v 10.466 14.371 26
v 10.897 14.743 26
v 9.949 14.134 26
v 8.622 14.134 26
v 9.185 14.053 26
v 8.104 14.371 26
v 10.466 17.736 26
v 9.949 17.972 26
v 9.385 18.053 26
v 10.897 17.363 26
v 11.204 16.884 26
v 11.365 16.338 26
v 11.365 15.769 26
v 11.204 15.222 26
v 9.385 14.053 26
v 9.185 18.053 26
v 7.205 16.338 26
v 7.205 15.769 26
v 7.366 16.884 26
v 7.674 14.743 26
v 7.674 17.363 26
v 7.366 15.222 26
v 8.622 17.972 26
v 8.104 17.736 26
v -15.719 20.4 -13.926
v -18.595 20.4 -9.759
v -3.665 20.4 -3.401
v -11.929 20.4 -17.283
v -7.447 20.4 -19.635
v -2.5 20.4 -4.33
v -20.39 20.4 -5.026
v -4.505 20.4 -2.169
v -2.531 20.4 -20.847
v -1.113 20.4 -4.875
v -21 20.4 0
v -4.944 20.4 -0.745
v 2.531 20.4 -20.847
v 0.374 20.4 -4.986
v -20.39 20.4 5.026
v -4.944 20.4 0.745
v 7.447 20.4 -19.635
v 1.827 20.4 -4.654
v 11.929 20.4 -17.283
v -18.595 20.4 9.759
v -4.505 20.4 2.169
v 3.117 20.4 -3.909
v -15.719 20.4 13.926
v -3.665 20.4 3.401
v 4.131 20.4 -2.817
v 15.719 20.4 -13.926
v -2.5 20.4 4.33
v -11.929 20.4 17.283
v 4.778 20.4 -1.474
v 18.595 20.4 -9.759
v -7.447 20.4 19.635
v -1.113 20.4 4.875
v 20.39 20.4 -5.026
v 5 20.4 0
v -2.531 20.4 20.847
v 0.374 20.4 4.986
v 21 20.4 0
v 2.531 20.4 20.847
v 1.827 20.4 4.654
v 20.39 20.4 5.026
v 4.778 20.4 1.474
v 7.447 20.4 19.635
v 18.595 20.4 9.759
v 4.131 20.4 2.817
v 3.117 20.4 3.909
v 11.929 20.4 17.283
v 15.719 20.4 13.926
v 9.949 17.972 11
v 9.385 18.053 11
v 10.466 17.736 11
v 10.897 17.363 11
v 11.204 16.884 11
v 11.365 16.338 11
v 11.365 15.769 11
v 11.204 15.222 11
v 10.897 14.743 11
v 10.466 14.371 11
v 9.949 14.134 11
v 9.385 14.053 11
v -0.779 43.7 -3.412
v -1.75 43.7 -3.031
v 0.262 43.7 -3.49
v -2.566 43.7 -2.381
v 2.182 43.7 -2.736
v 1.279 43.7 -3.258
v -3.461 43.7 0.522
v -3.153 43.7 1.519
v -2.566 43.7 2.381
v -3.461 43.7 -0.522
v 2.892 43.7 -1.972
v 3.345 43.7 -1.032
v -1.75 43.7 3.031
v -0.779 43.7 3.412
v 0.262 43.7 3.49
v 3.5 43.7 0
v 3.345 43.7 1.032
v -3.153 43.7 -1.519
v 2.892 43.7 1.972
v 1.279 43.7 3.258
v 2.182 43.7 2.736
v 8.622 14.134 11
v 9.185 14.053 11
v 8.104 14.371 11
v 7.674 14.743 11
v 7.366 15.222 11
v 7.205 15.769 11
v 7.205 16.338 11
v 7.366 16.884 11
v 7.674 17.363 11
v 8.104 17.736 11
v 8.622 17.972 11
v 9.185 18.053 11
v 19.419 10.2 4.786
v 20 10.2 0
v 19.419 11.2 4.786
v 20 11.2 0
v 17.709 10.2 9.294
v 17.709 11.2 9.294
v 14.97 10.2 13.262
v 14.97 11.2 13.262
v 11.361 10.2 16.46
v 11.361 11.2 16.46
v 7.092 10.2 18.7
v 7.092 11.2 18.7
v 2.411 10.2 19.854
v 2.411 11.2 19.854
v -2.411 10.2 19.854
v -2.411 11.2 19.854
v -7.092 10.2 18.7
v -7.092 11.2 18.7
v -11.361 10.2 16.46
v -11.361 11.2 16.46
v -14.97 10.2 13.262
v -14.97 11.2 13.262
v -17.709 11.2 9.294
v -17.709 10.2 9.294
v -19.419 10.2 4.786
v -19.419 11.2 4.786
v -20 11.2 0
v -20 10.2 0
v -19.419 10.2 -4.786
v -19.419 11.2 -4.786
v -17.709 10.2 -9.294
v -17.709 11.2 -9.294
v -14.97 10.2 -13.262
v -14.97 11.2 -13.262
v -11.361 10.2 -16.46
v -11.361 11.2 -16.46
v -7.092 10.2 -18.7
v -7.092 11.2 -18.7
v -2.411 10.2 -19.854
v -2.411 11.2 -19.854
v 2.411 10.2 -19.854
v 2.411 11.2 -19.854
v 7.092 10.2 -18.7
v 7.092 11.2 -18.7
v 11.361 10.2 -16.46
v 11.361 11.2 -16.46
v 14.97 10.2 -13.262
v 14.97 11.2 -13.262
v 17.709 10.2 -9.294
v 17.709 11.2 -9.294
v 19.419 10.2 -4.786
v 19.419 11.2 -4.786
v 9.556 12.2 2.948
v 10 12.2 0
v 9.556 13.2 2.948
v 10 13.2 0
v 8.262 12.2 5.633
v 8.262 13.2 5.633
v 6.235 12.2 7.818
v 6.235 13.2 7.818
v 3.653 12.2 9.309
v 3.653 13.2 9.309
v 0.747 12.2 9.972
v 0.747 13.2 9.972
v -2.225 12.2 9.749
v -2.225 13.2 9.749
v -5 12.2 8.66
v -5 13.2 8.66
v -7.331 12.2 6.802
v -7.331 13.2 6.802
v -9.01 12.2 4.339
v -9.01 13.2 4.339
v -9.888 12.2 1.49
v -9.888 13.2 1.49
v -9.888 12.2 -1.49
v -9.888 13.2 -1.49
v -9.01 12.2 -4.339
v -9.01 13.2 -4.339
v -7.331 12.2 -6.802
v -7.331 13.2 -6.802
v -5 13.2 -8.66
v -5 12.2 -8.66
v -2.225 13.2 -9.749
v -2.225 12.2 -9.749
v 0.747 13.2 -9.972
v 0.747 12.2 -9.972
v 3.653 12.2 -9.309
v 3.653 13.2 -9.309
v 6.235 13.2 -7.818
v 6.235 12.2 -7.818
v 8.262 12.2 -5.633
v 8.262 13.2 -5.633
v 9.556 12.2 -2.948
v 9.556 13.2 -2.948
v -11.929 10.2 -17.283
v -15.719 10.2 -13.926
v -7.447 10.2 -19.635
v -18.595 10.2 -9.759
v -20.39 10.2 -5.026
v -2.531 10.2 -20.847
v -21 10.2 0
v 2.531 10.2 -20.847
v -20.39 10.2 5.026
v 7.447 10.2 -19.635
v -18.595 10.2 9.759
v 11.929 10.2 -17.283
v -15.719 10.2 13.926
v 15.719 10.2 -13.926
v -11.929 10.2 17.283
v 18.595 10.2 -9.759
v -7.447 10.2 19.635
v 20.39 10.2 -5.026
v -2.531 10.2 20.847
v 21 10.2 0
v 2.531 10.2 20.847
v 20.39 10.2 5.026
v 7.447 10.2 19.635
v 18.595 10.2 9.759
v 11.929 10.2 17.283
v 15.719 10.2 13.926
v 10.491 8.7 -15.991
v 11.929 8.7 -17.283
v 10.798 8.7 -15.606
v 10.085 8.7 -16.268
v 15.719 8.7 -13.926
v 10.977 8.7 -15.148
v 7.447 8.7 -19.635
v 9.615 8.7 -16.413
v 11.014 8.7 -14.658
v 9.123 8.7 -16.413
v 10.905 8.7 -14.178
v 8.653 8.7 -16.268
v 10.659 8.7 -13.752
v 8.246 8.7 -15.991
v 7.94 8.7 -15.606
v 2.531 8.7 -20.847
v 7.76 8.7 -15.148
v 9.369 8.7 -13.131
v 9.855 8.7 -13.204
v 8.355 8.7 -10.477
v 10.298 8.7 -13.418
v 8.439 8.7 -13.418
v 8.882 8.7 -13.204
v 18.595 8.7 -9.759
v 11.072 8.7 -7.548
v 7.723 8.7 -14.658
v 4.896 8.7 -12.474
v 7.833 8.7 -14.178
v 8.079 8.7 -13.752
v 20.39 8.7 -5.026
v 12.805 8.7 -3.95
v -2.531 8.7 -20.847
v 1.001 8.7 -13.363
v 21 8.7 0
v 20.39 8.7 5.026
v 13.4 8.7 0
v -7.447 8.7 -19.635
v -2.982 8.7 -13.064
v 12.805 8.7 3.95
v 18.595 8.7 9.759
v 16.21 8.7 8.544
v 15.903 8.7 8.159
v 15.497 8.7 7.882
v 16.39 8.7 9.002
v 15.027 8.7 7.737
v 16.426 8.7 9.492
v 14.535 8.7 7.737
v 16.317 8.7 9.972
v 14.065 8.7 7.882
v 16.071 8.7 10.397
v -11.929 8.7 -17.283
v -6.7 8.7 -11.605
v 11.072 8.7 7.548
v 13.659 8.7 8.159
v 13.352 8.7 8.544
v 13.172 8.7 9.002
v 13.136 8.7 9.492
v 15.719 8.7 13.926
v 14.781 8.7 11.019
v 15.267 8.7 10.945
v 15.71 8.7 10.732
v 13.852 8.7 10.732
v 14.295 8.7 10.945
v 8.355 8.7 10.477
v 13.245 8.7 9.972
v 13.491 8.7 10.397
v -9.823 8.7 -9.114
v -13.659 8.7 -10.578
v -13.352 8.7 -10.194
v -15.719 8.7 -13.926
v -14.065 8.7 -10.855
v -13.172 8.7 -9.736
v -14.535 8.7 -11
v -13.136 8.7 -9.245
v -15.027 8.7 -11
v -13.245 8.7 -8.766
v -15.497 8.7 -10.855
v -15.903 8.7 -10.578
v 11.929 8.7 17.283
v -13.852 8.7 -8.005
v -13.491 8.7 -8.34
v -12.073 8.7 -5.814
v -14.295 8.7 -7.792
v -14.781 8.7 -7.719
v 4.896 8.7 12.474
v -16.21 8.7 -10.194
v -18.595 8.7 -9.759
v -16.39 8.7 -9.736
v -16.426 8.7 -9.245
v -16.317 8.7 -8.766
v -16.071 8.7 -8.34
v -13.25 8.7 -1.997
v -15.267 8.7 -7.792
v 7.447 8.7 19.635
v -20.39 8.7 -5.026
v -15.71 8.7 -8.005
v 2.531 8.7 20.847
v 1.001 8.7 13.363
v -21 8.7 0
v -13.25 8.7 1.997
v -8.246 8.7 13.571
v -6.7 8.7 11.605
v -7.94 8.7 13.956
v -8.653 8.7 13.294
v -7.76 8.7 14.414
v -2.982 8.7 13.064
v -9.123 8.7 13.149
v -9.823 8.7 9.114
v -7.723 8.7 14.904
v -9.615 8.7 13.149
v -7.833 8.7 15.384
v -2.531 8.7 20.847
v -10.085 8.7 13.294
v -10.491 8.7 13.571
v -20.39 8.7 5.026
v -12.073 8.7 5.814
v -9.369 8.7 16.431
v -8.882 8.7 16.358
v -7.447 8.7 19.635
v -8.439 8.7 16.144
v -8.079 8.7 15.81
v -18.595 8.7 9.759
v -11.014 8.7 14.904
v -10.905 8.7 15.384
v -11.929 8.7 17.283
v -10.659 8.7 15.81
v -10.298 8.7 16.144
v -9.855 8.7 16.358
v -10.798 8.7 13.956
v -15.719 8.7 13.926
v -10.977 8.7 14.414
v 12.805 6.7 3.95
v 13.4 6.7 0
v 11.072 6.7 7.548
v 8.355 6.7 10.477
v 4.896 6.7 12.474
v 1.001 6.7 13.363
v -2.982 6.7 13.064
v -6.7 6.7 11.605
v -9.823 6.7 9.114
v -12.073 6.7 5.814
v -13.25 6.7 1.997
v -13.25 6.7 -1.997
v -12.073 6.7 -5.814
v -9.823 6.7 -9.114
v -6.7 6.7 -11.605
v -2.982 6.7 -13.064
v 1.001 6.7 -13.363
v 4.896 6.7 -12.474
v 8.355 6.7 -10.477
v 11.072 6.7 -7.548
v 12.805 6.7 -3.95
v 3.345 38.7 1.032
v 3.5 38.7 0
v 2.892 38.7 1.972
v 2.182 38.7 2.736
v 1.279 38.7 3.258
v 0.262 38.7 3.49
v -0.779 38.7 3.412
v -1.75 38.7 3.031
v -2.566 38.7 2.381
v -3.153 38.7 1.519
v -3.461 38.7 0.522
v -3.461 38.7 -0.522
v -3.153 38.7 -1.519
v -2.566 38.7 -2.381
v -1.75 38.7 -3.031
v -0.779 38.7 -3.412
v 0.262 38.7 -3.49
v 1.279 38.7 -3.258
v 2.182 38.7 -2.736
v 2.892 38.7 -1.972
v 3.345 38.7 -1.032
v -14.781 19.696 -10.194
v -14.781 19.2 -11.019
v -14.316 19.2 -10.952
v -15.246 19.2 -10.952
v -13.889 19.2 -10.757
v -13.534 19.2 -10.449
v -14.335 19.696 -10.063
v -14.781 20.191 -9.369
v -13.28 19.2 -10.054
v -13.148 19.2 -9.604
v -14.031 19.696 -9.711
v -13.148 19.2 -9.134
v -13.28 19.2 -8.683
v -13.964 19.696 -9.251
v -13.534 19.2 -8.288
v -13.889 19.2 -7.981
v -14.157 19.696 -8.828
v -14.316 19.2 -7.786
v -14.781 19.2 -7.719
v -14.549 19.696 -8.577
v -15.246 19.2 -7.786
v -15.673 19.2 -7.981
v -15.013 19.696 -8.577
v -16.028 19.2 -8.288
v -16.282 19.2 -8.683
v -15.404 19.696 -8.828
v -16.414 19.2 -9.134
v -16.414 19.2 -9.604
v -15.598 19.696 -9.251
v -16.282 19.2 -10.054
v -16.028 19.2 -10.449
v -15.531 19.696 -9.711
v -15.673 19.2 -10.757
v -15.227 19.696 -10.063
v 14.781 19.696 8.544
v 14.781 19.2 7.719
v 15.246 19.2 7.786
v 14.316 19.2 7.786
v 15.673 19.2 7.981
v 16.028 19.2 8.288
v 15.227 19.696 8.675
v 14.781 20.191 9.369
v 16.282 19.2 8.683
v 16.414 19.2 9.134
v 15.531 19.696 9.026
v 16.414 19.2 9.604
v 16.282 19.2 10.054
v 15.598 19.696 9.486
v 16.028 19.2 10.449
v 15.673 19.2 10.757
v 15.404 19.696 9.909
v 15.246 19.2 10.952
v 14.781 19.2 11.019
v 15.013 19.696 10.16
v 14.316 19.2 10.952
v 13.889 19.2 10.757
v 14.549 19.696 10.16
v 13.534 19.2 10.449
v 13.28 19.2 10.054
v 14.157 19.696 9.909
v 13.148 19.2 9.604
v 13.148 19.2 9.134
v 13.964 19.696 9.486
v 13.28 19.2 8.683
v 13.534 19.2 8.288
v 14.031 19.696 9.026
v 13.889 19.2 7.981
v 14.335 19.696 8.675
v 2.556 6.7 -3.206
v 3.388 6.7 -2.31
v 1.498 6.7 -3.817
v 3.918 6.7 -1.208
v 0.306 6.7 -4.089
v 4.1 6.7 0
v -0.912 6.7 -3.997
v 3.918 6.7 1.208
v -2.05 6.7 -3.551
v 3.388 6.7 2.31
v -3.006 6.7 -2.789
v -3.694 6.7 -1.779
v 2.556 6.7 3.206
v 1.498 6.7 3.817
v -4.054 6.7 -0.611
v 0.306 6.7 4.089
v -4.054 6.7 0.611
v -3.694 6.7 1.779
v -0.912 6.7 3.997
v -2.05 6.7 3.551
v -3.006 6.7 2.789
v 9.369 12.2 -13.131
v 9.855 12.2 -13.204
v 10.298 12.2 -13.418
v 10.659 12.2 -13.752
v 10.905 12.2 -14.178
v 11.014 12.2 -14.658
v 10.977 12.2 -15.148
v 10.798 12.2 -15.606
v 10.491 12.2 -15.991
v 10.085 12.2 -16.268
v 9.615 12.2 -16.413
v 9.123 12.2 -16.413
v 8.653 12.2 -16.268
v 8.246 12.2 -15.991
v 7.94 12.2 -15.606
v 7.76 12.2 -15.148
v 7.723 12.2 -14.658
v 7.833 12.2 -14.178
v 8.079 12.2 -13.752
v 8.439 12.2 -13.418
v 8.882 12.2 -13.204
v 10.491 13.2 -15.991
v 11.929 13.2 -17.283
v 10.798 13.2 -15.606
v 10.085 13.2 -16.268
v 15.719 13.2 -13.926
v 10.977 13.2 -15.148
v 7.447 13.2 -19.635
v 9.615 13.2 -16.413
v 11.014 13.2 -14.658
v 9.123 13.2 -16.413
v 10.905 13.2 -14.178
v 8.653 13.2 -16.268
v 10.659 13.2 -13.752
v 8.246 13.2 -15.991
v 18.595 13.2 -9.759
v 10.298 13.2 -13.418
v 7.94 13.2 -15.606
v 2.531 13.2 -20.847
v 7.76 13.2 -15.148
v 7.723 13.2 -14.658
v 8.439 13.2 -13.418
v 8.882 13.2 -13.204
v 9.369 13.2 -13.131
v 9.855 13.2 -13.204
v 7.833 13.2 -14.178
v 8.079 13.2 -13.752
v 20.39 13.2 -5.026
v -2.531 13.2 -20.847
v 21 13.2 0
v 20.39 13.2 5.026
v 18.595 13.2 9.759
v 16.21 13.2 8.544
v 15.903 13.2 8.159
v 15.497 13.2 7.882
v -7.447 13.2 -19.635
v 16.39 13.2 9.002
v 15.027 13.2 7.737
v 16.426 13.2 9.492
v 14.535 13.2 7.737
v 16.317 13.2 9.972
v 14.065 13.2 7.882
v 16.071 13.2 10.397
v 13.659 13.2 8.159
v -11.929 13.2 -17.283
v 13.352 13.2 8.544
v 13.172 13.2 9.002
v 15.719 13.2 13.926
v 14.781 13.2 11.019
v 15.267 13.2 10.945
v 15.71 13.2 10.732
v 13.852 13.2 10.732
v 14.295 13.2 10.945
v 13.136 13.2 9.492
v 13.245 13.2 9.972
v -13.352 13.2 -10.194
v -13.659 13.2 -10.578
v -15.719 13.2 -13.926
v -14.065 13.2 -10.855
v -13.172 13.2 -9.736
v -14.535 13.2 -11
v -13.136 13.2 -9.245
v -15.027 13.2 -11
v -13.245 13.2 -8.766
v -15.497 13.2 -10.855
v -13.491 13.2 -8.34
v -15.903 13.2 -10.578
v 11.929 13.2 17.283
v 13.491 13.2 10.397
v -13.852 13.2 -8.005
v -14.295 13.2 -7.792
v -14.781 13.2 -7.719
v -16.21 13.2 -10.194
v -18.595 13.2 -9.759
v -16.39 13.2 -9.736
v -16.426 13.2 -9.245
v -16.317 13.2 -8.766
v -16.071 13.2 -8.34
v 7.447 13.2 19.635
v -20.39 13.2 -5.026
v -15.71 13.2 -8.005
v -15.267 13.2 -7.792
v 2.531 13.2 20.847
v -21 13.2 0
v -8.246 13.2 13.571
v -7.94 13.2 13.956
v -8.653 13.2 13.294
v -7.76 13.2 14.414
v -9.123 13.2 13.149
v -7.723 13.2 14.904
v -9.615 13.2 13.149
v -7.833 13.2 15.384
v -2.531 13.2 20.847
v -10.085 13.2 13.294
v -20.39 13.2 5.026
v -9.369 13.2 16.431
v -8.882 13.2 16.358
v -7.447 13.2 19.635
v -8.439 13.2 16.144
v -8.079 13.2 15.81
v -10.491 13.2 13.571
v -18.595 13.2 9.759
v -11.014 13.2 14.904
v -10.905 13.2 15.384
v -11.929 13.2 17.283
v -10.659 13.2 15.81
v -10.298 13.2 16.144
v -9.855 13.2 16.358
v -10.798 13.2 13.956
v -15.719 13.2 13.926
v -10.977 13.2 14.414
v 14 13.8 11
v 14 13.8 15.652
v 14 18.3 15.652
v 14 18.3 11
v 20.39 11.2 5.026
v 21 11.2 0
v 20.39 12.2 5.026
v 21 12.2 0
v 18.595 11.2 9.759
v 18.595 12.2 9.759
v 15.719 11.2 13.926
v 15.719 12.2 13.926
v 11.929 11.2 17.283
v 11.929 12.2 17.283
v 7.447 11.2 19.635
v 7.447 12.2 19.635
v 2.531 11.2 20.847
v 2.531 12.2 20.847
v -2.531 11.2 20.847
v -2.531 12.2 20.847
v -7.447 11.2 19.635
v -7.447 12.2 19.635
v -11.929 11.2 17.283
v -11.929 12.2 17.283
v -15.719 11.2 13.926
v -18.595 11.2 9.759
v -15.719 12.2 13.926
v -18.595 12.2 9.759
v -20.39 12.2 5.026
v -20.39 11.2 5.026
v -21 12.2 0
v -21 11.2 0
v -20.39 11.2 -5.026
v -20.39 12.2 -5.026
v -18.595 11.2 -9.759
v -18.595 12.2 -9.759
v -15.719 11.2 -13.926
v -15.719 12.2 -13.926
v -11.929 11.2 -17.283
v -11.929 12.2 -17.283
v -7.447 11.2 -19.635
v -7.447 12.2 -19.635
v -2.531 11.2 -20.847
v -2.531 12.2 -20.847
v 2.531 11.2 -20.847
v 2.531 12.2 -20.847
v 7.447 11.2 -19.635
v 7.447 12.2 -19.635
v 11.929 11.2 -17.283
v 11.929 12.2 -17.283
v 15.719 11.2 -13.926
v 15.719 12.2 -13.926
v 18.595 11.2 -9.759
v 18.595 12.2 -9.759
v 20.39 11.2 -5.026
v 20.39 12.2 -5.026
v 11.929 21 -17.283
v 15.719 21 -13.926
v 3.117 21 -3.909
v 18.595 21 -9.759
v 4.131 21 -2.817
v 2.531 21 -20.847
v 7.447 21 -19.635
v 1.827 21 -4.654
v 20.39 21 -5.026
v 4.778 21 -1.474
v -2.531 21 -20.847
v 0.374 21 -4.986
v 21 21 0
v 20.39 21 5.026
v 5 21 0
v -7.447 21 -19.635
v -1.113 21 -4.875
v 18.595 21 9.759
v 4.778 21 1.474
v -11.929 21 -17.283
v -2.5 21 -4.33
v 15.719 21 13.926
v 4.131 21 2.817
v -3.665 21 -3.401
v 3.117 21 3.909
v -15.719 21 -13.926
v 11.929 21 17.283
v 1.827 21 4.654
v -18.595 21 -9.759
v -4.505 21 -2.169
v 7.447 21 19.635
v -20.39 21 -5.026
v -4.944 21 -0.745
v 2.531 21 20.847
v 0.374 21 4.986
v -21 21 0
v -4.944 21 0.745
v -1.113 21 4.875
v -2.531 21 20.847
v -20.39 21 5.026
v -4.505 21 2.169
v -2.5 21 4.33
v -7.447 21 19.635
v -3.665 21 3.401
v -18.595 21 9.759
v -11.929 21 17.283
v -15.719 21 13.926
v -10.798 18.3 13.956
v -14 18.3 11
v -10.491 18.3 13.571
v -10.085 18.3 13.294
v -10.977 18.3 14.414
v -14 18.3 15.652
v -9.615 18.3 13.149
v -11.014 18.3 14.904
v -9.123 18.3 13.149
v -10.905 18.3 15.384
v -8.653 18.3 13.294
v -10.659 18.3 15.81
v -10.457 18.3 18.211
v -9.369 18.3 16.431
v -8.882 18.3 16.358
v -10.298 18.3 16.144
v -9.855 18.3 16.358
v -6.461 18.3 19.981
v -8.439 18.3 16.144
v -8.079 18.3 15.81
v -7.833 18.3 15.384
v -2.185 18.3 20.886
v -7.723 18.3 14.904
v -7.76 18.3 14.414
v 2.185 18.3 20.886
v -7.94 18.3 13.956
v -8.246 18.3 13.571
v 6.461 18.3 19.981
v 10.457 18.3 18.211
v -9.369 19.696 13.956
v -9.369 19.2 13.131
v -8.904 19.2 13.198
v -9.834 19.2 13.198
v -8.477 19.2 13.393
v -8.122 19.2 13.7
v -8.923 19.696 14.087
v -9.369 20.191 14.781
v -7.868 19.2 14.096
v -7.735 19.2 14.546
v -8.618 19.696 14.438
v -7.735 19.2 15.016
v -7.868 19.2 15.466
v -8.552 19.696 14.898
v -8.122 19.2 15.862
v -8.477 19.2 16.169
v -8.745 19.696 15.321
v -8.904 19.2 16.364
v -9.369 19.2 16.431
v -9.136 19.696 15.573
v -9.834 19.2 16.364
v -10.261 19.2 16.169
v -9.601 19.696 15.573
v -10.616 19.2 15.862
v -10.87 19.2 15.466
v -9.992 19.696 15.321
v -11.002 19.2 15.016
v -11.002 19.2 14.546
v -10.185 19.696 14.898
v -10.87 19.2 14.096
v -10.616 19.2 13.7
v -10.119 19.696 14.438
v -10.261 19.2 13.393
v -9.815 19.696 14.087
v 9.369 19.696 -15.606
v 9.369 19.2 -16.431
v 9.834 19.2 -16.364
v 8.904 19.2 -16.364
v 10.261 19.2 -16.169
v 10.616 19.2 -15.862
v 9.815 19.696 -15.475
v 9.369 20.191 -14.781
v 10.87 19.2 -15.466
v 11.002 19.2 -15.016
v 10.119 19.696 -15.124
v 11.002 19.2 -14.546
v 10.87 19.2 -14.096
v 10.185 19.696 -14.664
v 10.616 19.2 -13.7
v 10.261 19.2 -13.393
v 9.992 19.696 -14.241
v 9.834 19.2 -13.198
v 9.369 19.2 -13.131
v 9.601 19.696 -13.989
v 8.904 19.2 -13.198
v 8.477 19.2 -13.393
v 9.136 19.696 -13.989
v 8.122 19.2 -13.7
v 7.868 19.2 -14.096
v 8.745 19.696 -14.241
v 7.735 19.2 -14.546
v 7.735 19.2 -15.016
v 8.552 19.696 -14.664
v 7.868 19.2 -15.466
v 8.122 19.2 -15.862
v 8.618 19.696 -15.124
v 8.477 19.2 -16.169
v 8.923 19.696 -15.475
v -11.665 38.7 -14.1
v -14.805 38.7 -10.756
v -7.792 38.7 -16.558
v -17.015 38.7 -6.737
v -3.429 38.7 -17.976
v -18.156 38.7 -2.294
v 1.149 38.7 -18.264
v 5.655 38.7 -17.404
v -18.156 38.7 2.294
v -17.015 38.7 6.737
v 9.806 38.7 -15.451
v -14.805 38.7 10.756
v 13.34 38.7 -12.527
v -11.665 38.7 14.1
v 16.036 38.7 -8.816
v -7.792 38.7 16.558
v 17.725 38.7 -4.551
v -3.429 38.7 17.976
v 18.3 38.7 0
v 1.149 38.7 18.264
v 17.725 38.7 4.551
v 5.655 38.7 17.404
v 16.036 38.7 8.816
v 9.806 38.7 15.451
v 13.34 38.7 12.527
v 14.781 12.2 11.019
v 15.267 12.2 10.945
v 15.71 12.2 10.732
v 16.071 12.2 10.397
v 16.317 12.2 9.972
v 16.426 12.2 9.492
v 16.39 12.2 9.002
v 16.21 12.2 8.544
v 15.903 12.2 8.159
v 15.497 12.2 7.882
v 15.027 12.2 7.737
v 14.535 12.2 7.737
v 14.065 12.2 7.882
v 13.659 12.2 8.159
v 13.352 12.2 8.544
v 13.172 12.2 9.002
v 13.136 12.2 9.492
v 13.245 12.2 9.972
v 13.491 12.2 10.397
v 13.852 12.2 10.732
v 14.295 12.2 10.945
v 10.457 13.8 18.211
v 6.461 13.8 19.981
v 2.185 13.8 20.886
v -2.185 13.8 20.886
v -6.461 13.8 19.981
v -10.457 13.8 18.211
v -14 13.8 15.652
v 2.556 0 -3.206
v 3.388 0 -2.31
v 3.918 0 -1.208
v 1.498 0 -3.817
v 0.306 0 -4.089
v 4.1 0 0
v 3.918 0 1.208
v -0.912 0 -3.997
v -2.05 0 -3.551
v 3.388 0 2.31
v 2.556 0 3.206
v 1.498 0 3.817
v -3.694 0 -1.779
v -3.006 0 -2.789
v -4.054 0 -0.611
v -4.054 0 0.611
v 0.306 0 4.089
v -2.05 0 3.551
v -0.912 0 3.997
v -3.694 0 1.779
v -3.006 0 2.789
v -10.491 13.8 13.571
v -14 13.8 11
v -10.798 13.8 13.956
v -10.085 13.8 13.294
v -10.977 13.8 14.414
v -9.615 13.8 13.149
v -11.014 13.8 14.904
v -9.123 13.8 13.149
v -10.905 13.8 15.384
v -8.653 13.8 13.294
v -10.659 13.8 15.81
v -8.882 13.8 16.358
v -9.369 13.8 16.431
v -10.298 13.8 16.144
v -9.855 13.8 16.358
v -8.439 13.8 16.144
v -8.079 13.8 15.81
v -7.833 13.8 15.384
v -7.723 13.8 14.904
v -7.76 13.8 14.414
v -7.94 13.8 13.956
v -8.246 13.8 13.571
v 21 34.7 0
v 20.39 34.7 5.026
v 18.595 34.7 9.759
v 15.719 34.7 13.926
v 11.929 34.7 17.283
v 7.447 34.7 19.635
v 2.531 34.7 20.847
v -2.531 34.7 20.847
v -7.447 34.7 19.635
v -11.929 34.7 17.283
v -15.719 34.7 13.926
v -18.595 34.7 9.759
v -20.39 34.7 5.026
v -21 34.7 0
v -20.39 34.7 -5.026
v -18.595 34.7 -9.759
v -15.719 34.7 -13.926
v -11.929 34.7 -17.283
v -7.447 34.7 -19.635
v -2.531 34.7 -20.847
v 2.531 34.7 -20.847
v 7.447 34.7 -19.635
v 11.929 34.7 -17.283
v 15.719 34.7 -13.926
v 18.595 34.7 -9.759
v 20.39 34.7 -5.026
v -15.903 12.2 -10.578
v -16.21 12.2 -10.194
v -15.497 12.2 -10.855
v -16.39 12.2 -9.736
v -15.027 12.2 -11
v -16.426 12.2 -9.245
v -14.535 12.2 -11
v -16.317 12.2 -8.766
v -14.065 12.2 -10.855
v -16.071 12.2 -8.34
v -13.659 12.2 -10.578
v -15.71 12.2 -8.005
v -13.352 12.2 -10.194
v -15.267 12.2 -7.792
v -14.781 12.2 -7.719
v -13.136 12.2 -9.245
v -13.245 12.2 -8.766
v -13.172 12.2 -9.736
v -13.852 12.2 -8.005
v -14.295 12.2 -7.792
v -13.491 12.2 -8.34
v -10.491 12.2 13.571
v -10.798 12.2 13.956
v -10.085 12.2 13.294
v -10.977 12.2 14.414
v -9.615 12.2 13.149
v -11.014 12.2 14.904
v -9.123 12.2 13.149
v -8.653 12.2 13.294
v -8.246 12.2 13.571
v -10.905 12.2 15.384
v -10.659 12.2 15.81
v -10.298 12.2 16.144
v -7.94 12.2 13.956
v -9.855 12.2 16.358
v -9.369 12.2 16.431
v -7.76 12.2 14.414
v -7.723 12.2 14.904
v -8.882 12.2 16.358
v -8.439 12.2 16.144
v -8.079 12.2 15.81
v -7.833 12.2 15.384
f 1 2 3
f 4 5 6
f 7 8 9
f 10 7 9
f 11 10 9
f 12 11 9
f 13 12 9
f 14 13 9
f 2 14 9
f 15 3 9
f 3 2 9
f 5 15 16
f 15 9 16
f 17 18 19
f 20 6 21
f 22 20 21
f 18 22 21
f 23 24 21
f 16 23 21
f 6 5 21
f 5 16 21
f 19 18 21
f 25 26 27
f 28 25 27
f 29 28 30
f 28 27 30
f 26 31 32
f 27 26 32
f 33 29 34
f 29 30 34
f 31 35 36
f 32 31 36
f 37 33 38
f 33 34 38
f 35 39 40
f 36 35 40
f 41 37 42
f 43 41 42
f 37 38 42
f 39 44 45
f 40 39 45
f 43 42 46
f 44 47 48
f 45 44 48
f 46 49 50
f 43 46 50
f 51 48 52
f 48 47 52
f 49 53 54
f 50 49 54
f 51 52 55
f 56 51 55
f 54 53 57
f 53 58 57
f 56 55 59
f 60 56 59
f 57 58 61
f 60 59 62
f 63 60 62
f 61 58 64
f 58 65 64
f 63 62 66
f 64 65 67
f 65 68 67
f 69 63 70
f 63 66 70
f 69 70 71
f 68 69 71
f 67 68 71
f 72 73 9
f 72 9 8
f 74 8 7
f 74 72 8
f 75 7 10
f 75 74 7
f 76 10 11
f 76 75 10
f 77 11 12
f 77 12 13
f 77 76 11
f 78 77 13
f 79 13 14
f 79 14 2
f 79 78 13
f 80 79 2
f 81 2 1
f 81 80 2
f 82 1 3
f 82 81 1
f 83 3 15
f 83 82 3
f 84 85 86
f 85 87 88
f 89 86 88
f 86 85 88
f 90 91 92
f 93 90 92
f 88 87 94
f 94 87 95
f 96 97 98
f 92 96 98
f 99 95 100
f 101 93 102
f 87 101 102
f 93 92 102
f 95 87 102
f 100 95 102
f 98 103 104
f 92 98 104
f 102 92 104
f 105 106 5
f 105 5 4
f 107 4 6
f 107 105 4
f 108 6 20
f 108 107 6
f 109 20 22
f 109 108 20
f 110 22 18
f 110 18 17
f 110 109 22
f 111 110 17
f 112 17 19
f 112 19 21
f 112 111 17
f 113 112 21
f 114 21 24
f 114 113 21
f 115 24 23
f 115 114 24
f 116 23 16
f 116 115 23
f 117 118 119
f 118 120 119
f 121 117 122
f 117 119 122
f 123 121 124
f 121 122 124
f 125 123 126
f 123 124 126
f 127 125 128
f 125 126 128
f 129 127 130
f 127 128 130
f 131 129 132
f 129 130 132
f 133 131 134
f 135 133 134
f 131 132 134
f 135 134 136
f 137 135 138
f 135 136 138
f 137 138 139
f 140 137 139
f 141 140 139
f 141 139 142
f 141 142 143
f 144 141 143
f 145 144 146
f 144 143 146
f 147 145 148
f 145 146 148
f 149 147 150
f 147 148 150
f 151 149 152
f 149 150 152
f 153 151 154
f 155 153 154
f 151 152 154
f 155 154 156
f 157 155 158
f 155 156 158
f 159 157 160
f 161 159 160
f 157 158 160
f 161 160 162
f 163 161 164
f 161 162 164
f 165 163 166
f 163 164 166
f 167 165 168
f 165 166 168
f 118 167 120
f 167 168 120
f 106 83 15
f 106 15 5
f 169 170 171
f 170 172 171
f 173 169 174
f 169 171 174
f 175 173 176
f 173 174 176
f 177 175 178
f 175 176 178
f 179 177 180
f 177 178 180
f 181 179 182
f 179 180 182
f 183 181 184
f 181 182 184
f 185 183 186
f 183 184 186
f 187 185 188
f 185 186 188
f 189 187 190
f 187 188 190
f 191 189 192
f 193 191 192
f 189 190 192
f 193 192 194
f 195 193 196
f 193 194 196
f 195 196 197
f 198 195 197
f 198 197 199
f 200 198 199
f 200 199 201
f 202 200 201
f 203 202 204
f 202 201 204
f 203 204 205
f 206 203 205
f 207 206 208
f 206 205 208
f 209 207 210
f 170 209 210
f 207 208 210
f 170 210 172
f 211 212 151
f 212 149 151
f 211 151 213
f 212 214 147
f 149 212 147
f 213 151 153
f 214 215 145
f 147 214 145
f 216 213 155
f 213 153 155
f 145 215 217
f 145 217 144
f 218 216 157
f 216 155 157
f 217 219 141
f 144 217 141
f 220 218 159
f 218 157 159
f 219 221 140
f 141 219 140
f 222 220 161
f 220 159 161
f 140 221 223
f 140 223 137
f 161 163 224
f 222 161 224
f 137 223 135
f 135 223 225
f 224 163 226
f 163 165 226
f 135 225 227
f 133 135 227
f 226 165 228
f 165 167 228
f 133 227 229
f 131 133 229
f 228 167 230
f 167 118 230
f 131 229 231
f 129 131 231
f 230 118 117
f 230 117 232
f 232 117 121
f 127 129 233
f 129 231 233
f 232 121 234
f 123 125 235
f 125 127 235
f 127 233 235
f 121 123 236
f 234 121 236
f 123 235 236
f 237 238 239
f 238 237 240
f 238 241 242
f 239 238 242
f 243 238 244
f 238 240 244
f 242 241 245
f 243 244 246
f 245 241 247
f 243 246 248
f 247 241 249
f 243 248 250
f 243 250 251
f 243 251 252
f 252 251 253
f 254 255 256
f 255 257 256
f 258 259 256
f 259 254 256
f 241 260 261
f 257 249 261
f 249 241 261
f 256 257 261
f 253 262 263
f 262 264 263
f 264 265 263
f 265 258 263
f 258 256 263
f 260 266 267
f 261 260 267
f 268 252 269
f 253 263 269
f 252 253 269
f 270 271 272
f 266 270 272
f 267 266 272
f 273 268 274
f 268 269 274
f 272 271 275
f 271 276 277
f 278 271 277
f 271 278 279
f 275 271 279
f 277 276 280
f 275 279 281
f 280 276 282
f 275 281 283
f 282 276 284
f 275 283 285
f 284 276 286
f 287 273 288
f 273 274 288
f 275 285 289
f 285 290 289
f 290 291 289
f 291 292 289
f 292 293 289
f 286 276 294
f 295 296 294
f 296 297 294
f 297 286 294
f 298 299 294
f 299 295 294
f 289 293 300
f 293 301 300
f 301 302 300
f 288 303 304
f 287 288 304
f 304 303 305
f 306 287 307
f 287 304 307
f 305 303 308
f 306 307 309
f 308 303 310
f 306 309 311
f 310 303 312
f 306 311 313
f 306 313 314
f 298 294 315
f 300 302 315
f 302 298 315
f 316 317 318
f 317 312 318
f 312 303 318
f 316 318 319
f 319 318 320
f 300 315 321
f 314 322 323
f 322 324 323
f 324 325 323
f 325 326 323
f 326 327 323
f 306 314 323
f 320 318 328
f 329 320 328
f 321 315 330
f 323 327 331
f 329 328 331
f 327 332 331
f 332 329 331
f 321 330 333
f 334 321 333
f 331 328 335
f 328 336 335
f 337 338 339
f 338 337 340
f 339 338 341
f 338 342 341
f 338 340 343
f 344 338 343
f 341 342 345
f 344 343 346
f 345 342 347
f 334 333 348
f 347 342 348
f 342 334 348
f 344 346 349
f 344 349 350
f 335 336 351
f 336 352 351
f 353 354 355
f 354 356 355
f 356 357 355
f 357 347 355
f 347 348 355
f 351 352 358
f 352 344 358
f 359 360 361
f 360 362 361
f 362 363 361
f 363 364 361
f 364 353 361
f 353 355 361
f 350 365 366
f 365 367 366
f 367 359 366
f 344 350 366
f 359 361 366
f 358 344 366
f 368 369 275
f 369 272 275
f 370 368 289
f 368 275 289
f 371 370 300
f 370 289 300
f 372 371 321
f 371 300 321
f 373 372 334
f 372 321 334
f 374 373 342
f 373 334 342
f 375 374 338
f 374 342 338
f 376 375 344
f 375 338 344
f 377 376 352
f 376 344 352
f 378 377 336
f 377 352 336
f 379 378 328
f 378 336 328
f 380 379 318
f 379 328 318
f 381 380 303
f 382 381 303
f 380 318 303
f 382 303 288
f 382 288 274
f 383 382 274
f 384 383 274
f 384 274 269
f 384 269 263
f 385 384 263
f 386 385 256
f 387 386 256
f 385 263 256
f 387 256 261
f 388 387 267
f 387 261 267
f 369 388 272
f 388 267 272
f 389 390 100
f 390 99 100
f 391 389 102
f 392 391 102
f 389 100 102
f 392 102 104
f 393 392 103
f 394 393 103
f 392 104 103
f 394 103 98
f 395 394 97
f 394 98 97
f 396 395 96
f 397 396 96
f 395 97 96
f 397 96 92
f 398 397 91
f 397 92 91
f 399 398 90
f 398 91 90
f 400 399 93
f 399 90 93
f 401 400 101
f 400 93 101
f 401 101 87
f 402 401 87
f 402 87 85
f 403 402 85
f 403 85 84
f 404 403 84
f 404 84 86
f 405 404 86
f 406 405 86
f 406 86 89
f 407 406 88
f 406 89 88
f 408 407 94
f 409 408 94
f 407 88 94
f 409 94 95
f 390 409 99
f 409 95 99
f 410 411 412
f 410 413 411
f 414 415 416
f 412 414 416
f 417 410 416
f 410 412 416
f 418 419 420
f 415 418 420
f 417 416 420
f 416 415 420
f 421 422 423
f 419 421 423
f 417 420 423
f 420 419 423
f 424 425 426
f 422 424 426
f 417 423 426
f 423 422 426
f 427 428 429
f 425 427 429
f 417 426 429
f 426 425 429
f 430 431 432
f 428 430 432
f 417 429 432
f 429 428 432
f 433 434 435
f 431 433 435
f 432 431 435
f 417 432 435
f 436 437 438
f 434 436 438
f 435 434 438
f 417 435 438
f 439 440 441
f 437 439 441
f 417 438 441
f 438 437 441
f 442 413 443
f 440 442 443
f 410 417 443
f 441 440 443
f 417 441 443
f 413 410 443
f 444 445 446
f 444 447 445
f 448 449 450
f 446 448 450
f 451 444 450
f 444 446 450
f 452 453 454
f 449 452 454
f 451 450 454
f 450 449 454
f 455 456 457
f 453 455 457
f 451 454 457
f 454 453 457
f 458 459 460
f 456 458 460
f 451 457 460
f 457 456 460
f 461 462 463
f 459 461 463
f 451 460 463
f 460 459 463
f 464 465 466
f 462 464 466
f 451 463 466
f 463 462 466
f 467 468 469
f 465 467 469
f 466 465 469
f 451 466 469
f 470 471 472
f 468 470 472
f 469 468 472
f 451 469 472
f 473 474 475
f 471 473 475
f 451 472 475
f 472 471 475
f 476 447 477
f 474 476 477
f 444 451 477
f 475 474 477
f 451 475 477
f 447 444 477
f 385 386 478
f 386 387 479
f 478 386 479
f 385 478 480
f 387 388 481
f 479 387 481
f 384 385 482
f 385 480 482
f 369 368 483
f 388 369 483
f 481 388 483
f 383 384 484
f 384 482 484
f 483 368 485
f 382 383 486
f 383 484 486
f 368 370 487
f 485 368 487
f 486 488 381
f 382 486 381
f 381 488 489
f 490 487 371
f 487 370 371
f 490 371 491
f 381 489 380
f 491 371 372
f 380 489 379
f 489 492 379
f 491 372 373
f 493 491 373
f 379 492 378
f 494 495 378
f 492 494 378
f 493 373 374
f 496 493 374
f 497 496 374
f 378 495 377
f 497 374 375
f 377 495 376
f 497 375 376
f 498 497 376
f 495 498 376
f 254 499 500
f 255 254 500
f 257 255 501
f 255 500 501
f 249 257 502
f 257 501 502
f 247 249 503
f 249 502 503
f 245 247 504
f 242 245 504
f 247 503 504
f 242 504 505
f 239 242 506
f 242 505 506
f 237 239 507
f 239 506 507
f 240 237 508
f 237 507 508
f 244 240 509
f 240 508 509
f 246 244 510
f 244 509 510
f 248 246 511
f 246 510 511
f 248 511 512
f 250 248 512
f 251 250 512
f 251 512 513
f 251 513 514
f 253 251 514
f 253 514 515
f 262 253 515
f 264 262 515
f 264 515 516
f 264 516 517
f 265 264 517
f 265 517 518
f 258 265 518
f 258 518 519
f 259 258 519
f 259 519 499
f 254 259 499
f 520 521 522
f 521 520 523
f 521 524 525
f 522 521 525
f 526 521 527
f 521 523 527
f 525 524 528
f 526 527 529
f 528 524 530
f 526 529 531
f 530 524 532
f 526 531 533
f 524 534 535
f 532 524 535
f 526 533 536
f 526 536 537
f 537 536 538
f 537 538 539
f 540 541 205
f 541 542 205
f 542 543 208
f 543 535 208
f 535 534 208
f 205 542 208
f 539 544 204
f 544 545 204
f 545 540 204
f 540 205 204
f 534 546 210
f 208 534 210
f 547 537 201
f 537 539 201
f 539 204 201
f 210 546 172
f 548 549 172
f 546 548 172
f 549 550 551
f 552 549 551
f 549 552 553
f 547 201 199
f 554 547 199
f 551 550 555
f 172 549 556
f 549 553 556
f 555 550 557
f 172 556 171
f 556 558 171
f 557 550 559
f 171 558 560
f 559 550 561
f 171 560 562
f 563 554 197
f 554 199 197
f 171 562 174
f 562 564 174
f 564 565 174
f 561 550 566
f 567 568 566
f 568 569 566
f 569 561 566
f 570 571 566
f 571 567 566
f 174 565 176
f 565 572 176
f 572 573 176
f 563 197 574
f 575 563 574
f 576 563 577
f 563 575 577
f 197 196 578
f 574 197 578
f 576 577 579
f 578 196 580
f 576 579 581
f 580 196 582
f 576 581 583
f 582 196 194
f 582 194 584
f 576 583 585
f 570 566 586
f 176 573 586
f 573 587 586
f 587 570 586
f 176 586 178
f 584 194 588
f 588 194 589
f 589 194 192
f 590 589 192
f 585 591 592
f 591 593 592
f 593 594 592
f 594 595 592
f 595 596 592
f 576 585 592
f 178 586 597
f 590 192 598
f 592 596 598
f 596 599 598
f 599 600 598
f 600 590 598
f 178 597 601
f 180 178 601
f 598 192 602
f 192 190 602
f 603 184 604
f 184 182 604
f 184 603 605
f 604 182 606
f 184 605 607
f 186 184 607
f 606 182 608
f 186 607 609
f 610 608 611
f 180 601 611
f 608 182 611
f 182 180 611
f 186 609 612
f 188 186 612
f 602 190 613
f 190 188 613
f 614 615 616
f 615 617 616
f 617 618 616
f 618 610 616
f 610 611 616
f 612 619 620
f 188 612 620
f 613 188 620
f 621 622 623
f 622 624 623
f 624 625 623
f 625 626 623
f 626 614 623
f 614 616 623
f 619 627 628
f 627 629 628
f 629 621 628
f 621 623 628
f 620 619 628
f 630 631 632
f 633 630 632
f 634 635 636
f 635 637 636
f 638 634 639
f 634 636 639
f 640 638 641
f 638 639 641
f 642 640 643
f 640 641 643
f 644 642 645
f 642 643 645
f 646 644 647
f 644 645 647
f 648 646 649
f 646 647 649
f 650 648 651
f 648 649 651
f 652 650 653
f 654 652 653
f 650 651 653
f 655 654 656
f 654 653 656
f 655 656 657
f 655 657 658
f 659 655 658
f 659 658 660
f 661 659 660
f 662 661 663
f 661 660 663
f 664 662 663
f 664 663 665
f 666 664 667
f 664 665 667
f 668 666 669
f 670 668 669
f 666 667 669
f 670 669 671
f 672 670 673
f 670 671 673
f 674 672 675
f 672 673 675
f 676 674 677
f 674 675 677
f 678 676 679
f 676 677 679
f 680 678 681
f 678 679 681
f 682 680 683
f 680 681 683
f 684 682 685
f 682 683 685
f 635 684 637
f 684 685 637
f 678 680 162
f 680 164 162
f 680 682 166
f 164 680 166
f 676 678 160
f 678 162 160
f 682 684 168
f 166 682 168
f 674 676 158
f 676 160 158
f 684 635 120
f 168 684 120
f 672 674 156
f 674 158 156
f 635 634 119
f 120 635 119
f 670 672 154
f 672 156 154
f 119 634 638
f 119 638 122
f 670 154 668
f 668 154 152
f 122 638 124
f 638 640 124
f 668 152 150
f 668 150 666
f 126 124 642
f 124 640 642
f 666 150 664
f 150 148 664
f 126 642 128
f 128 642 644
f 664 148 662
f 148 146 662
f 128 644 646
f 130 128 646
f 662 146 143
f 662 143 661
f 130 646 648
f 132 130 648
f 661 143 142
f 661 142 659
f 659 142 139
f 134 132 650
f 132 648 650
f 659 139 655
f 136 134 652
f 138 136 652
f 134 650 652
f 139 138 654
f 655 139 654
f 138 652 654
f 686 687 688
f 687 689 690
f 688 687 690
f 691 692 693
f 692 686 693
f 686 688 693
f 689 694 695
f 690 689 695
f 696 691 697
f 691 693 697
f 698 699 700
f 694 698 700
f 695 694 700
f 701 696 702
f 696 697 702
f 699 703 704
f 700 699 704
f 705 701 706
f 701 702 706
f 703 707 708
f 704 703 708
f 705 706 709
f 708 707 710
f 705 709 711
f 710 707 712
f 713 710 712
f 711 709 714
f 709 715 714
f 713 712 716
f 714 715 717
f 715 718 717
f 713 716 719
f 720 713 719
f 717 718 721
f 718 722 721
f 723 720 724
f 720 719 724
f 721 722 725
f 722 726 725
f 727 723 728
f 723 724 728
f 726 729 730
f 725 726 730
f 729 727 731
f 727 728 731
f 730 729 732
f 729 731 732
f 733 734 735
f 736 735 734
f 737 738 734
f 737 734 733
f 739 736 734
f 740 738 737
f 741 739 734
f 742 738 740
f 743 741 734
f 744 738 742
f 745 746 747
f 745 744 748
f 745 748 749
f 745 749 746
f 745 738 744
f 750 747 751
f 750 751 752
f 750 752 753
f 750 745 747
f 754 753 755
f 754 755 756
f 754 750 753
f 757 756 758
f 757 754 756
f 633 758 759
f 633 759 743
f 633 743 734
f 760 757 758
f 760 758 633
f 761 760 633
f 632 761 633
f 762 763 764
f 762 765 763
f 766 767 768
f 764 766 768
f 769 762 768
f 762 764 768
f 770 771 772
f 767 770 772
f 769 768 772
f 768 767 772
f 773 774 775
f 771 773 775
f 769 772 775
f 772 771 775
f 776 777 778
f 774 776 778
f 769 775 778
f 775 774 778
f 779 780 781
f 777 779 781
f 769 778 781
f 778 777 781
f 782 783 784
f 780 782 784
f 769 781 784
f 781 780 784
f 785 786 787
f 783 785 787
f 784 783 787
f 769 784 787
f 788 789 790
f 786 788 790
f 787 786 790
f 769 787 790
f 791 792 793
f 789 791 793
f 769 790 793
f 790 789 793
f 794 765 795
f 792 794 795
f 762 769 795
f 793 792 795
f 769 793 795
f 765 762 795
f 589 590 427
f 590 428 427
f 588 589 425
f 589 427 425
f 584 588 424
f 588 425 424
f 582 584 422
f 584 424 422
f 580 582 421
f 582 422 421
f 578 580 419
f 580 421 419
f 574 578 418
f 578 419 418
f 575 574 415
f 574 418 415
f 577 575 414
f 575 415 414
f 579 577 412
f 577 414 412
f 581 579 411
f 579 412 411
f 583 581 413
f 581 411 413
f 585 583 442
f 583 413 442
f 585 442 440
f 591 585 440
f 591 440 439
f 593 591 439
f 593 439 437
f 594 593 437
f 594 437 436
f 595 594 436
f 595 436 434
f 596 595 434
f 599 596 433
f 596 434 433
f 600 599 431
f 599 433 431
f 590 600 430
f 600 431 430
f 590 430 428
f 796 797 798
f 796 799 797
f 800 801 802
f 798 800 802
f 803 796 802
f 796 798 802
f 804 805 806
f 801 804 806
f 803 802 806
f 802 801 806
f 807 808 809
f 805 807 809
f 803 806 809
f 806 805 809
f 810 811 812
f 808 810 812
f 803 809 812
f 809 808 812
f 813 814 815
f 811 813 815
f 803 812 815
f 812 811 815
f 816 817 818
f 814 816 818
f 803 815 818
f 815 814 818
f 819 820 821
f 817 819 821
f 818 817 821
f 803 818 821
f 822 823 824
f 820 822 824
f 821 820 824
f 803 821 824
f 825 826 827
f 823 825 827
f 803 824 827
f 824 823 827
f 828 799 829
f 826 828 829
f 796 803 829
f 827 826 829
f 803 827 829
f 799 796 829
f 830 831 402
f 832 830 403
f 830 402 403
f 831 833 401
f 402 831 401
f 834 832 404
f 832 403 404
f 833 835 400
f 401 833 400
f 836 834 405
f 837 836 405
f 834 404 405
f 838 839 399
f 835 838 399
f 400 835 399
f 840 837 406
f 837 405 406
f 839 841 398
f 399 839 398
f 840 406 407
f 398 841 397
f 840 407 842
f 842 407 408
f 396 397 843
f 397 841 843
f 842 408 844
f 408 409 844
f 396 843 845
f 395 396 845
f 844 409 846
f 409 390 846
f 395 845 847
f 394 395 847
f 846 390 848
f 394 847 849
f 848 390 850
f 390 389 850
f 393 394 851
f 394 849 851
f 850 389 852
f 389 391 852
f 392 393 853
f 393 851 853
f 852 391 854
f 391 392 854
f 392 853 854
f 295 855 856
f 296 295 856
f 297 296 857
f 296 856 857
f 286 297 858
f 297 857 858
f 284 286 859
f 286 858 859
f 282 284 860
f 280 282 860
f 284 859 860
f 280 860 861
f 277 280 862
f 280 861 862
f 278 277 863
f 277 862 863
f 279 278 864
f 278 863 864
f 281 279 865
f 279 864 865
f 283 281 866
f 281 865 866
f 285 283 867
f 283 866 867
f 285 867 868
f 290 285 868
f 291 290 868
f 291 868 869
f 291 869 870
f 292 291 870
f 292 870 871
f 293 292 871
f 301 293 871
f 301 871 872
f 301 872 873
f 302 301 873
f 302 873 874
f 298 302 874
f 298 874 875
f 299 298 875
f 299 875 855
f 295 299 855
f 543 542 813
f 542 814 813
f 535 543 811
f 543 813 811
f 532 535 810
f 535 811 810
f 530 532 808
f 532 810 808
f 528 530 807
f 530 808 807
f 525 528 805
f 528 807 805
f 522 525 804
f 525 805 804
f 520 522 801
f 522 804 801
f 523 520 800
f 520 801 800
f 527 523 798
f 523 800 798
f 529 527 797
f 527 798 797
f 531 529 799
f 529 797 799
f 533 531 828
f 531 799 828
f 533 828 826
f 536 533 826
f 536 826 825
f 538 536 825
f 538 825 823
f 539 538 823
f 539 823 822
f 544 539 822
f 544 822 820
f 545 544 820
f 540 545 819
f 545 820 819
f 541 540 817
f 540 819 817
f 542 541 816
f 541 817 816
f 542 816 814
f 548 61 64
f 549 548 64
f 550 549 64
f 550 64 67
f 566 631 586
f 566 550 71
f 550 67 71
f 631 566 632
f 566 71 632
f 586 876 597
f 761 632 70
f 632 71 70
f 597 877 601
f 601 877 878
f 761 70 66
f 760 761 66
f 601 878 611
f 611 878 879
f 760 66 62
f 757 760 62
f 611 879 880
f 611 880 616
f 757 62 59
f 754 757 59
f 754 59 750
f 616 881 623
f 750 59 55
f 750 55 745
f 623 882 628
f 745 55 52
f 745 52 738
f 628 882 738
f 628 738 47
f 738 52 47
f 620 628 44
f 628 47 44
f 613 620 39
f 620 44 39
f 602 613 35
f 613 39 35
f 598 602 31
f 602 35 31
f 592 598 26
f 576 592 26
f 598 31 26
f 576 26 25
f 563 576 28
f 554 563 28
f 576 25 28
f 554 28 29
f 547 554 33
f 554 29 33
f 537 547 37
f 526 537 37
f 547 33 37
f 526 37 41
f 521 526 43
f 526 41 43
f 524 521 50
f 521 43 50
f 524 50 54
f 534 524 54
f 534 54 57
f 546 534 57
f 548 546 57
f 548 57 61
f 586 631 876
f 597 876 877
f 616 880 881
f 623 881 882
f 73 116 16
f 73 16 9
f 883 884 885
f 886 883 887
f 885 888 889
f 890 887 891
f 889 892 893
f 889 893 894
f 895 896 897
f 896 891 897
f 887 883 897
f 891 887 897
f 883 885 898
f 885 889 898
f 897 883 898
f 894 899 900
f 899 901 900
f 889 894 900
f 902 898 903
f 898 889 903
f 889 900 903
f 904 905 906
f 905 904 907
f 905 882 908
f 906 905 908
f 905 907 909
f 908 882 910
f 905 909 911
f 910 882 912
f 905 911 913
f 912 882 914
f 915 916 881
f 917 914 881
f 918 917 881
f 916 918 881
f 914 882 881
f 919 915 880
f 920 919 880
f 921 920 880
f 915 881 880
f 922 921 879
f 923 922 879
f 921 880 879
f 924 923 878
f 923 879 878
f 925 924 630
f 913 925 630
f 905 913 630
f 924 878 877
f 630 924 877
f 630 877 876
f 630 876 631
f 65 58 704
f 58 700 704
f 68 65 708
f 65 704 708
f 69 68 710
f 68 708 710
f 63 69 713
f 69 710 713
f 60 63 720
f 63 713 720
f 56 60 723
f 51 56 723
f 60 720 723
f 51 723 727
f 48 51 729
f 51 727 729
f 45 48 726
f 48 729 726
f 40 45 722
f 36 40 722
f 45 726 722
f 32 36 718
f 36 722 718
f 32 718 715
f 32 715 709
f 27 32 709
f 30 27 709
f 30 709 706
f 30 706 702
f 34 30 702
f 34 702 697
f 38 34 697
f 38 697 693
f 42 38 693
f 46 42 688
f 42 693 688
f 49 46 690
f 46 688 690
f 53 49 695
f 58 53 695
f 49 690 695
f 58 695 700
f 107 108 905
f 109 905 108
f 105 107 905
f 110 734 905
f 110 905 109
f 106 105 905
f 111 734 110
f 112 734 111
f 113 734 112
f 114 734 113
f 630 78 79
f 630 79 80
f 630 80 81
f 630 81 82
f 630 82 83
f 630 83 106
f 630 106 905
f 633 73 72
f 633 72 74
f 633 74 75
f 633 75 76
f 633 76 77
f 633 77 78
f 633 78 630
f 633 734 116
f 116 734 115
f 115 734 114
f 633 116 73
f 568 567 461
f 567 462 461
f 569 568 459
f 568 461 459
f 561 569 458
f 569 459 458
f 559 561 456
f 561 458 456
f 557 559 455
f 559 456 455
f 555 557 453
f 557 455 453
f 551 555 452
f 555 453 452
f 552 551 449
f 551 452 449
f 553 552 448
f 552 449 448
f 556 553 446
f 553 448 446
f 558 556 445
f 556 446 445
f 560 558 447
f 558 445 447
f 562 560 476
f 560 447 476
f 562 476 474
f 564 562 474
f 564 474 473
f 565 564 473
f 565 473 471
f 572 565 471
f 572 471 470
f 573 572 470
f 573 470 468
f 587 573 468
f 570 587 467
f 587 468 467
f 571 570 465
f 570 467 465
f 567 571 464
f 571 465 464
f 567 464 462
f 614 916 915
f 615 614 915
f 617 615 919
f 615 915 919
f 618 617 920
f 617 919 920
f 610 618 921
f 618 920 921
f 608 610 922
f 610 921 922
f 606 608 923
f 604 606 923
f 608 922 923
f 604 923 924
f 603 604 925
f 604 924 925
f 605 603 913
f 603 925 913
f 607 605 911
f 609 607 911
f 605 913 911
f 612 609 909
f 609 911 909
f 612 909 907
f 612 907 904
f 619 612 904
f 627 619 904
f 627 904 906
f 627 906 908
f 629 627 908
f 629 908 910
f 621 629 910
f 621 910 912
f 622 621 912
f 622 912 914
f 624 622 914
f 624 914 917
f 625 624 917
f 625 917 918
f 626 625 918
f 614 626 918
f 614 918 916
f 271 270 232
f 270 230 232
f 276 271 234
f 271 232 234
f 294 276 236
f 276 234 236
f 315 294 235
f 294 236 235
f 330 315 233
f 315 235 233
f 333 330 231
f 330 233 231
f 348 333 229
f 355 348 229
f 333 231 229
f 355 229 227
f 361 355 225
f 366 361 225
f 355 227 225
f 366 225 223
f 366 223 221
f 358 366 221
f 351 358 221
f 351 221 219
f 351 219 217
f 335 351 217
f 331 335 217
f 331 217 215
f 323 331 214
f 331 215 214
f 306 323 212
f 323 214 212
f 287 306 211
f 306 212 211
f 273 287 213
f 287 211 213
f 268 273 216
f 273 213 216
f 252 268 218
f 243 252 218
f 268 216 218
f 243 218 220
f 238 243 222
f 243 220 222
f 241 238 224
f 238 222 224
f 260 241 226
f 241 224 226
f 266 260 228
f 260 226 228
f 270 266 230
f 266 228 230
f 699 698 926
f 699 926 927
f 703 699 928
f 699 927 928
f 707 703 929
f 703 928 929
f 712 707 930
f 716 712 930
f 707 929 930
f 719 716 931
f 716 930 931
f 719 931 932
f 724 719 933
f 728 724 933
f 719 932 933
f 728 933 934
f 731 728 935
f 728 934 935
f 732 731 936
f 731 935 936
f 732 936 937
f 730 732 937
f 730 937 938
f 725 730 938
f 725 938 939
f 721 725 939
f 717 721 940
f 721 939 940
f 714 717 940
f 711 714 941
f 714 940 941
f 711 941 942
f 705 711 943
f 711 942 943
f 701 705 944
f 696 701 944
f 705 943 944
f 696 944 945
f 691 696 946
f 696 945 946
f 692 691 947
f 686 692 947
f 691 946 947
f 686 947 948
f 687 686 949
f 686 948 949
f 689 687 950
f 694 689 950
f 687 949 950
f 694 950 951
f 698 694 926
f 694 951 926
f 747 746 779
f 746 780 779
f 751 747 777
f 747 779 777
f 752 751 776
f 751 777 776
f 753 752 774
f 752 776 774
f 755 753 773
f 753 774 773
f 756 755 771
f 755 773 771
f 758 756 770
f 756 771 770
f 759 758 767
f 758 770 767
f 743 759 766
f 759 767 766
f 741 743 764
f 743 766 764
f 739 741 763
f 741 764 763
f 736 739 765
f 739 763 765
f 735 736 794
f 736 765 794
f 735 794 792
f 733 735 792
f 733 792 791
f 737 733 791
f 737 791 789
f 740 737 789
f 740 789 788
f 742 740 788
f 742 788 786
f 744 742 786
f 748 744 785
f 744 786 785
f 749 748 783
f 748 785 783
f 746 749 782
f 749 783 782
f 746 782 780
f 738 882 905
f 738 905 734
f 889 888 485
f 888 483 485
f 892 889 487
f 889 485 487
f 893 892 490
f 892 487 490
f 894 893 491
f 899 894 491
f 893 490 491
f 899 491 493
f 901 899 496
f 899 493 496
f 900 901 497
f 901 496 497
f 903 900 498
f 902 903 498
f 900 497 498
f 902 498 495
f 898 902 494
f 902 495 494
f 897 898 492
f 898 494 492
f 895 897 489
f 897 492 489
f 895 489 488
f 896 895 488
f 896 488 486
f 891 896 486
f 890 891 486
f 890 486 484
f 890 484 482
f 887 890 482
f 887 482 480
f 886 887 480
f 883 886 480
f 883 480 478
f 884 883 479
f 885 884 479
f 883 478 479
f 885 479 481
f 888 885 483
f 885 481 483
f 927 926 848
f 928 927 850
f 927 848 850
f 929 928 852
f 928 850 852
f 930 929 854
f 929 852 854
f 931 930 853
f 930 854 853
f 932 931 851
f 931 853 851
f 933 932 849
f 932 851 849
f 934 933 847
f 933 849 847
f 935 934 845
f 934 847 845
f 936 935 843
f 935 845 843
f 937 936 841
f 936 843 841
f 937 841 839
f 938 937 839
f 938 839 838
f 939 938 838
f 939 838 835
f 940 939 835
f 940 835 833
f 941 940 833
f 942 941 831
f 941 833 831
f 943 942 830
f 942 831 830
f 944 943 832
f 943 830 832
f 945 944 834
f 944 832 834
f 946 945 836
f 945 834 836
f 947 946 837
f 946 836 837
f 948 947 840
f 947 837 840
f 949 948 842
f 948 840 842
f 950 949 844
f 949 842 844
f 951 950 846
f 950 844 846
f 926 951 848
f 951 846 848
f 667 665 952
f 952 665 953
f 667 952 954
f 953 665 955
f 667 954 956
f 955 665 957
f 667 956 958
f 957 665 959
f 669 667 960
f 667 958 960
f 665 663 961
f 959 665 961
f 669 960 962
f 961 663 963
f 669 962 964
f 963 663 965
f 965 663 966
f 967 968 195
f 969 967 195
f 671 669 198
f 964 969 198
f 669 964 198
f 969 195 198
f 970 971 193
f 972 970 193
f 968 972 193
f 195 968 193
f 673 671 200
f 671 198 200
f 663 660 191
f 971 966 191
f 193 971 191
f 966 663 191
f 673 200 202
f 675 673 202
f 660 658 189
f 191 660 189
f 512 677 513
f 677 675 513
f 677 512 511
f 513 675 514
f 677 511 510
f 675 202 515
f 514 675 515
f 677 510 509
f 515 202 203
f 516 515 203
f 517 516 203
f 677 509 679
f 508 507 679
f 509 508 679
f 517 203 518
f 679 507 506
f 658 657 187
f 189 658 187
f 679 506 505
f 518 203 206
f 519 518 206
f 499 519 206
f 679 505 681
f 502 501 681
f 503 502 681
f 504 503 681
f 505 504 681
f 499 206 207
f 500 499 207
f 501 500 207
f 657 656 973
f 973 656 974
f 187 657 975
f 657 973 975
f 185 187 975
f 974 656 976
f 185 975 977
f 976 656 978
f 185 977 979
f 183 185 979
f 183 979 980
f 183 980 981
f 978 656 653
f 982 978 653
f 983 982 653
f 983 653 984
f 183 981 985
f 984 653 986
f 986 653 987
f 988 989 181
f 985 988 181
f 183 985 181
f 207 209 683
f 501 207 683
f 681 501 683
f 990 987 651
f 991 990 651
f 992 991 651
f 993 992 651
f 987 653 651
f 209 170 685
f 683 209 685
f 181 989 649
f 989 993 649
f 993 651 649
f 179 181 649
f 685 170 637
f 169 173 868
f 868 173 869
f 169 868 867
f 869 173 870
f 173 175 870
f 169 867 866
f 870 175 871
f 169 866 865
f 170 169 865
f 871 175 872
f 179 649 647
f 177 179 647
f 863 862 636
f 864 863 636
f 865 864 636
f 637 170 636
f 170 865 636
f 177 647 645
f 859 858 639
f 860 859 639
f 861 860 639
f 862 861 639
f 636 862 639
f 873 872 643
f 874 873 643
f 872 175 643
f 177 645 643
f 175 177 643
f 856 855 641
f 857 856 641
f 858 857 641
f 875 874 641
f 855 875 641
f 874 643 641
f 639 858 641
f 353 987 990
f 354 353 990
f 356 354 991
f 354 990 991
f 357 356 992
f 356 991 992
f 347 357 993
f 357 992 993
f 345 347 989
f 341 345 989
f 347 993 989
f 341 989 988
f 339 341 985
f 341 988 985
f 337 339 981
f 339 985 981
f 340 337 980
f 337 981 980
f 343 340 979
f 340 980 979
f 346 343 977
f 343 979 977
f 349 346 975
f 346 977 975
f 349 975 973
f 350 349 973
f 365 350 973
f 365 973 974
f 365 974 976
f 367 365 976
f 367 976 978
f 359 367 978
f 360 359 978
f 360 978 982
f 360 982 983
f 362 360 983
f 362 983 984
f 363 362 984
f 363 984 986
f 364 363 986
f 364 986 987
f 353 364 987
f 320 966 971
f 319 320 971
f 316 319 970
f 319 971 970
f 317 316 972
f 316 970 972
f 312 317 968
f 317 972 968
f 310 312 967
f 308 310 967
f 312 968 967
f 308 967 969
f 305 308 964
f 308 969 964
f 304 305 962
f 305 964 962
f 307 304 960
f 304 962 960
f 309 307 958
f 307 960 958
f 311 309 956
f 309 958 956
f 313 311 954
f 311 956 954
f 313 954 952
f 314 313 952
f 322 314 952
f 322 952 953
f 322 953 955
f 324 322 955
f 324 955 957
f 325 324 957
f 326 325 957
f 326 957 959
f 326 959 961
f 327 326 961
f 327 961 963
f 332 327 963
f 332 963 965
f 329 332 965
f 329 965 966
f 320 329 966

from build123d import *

# Parameters (mm, degrees)
SKETCH_2_W             = 28
SKETCH_2_H             = 4.5
CUT_EXTRUDE_1_DEPTH    = 10
EXTRUDE_1_DEPTH        = 15
HOLE_WIZARD_M4_2_D     = 3.3
HOLE_WIZARD_M4_2_DEPTH = 10.5
HOLE_WIZARD_M4_2_TIP   = 0.991420021


with BuildPart() as part:
    # 草图1 → 旋转1 (revolve)
    with BuildSketch(Plane.XY):
        Polygon((0, 0), (4.1, 0), (4.1, 6.7), (13.4, 6.7), (13.4, 8.7), (21, 8.7), (21, 10.2), (20, 10.2), (20, 11.2), (21, 11.2), (21, 12.2), (10, 12.2), (10, 13.2), (21, 13.2), (21, 20.4), (5, 20.4), (5, 21), (21, 21), (21, 34.7), (18.3, 38.7), (3.5, 38.7), (3.5, 43.7), (0, 43.7), align=None)
    revolve(axis=Axis((0, 43.7, 0), (0, -1, 0)))

    # 草图2 → 切除-拉伸1 (cut)
    with BuildSketch(Plane.XY.offset(21)):
        with Locations((0, 16.05)):
            Rectangle(SKETCH_2_W, SKETCH_2_H)
    extrude(amount=-CUT_EXTRUDE_1_DEPTH, mode=Mode.SUBTRACT)

    # 草图3 → 凸台-拉伸1 (add)
    with BuildSketch(Plane.XY.offset(11)):
        with BuildLine():
            Line((9.185056323, 18.053194417), (9.385056323, 18.053194417))
            ThreePointArc((9.385056323, 18.053194417), (11.385056323, 16.053194417), (9.385056323, 14.053194417))
            Line((9.385056323, 14.053194417), (9.185056323, 14.053194417))
            ThreePointArc((9.185056323, 14.053194417), (7.185056323, 16.053194417), (9.185056323, 18.053194417))
        make_face()
    extrude(amount=EXTRUDE_1_DEPTH)

    # M4 螺纹孔2
    with Locations(Plane(origin=(-14.780985523, 8.7, -9.368696119), x_dir=(0, 0, -1), z_dir=(0, -1, 0))):
        with Locations((0, 0), (-24.149681642, 5.412289404), (5.412289404, 24.149681642), (-18.737392238, 29.561971046)):
            Hole(HOLE_WIZARD_M4_2_D / 2, depth=HOLE_WIZARD_M4_2_DEPTH)
            with Locations((0, 0, -(HOLE_WIZARD_M4_2_DEPTH + HOLE_WIZARD_M4_2_TIP / 2))):  # 118° drill point
                Cone(0, HOLE_WIZARD_M4_2_D / 2, HOLE_WIZARD_M4_2_TIP, mode=Mode.SUBTRACT)


solid = part.part
